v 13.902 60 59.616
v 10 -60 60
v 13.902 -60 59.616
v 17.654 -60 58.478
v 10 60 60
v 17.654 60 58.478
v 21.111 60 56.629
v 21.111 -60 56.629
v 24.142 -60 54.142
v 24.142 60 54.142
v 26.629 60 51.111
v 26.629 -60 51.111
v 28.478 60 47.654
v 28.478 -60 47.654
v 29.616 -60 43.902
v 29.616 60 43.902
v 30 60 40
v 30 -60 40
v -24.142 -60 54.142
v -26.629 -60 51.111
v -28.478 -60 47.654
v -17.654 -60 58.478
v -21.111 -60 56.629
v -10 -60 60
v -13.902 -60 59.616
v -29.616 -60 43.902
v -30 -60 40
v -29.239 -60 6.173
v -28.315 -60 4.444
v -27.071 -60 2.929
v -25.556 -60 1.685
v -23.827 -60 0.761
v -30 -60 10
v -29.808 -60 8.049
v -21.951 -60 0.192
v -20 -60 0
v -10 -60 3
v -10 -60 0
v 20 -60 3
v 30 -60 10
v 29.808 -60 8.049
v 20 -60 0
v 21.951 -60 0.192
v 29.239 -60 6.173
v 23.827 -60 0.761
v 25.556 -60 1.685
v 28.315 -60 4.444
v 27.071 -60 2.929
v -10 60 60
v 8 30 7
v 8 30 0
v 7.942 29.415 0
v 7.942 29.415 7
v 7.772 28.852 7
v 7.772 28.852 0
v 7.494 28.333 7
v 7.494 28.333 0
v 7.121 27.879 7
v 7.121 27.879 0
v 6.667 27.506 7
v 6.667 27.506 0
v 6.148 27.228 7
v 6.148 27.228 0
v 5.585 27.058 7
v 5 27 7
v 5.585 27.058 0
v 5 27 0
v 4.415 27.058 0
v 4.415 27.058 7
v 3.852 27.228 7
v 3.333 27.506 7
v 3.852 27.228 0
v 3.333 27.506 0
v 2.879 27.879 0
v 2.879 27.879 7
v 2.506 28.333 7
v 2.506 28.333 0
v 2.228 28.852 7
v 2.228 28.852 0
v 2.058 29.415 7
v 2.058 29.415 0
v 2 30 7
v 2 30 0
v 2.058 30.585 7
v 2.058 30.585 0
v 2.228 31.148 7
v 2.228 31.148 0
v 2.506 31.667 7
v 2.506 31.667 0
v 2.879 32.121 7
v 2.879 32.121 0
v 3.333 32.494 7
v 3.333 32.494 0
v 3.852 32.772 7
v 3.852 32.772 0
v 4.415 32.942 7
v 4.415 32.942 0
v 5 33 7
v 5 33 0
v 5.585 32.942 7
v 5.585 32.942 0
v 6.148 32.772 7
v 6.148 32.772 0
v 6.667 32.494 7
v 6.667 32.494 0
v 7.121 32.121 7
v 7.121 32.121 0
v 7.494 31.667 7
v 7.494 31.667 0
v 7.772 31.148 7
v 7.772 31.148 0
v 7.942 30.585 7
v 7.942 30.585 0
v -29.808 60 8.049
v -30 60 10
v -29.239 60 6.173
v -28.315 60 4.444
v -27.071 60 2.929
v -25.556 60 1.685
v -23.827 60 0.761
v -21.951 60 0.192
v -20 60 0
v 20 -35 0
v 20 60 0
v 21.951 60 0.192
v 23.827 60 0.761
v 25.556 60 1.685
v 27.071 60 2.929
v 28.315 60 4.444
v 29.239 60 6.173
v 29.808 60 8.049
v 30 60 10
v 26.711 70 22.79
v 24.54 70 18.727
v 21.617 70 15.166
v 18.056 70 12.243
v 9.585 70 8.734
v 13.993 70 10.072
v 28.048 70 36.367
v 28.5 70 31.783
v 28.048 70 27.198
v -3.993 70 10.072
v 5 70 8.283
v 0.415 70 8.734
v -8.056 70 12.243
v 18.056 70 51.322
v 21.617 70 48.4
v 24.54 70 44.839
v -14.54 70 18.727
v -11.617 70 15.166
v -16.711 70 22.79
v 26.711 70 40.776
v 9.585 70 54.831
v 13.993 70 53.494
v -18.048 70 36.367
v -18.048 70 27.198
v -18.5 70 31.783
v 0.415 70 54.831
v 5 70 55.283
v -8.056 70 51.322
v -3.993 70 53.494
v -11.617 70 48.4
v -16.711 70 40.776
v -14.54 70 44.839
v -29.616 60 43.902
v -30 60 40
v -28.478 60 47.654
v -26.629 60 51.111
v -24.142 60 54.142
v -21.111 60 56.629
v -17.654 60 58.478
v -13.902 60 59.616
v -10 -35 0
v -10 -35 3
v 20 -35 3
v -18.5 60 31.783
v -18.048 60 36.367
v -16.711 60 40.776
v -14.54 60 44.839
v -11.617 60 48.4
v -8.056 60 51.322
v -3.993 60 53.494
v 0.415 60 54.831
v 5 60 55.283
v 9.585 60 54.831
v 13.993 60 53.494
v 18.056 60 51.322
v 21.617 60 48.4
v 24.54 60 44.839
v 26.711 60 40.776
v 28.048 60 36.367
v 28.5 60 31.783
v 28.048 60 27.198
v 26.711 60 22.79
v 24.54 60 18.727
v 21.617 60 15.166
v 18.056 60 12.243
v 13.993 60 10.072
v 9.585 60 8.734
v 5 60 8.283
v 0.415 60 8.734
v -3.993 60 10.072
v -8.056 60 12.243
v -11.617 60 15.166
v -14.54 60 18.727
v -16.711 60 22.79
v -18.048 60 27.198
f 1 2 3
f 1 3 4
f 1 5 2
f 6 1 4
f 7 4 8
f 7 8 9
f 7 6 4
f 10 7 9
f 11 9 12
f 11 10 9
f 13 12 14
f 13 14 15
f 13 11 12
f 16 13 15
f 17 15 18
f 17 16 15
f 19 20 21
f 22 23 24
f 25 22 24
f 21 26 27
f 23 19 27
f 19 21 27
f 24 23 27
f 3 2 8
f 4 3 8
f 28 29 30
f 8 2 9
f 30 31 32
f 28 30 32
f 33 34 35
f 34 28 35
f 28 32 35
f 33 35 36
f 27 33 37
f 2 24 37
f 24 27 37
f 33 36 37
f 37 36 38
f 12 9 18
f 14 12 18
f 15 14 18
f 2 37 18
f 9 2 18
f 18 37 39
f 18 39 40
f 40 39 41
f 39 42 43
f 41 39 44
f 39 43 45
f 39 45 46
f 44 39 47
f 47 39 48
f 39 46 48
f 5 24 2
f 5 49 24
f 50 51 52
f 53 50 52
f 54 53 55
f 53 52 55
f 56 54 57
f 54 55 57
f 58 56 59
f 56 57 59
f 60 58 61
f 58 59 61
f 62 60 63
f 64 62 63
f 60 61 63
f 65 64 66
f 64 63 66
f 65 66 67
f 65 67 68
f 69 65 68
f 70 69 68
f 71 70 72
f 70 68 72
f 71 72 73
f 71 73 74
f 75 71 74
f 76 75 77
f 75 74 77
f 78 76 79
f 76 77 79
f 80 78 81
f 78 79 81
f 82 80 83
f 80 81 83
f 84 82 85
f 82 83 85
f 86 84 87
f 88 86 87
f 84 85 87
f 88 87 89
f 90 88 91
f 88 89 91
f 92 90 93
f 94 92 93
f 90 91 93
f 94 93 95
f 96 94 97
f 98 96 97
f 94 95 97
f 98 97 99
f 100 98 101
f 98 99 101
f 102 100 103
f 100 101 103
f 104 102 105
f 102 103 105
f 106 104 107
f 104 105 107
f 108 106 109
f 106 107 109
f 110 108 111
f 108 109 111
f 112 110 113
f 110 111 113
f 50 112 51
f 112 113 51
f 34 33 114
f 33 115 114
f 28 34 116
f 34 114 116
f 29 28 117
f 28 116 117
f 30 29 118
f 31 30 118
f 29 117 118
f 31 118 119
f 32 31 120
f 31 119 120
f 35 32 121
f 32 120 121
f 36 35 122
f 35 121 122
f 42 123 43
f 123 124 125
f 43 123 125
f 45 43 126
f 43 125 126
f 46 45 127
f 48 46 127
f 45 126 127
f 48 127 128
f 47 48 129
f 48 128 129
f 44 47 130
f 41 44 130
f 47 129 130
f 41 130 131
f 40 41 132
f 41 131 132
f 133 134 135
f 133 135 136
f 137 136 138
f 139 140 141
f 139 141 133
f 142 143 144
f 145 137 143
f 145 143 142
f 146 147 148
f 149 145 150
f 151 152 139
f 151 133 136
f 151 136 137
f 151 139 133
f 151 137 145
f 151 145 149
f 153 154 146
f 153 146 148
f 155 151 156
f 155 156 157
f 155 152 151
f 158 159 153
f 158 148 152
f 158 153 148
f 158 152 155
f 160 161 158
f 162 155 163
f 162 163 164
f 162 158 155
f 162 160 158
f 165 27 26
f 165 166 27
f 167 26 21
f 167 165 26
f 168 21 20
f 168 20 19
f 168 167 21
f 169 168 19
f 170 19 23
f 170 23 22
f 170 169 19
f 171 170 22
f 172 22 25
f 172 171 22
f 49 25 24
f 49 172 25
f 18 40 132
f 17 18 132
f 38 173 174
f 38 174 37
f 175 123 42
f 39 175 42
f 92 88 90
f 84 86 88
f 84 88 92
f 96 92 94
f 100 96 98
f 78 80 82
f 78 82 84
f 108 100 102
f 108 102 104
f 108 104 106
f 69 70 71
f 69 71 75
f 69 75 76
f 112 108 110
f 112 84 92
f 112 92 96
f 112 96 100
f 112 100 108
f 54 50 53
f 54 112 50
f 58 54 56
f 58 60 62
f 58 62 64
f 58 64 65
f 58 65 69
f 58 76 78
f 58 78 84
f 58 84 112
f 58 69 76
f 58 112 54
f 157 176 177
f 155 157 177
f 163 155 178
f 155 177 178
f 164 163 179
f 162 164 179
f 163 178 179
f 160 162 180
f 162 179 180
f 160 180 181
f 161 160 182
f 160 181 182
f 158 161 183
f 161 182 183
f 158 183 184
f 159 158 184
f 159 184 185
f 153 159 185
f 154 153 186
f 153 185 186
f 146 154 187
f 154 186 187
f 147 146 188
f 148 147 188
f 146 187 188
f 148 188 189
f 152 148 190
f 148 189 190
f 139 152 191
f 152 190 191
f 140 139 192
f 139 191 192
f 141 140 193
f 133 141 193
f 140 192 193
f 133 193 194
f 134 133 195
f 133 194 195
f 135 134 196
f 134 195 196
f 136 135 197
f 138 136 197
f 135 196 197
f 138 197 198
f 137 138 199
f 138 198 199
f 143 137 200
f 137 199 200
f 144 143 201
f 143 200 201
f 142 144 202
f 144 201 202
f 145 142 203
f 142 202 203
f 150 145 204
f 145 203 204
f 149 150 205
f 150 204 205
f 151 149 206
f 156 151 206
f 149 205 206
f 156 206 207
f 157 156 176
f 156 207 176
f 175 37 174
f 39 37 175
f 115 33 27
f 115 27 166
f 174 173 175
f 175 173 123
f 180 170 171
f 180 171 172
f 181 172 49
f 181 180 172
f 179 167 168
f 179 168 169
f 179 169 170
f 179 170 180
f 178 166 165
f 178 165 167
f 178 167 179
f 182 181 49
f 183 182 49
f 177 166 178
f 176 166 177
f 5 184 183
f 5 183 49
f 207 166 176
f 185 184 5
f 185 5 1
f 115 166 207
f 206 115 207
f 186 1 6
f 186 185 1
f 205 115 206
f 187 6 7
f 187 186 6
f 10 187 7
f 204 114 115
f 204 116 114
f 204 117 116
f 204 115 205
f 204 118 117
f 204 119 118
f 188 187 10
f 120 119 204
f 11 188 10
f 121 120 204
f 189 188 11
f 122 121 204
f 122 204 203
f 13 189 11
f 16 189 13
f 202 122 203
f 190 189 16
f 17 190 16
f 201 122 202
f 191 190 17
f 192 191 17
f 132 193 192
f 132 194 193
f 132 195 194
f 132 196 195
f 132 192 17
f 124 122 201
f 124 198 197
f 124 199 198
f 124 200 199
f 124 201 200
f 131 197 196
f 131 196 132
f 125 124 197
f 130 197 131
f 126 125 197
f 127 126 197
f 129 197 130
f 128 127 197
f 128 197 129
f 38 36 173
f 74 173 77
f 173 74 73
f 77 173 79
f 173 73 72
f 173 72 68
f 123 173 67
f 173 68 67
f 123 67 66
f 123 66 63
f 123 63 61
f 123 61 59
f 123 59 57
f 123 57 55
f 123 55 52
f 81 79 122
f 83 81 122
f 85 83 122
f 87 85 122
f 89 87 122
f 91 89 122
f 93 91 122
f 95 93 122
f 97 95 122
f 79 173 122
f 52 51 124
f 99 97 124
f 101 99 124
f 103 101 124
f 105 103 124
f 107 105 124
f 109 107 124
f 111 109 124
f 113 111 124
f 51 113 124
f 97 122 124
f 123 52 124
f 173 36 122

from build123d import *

# Parameters (mm, degrees)
F0_W     = 60
F0_H     = 120
F1_DEPTH = 60
F2_R     = 3
F3_DEPTH = 7
F4_R     = 20
F5_R     = 10
F6_R     = 23.5
F7_DEPTH = 10
F8_W     = 30
F8_H     = 25
F9_DEPTH = 3


with BuildPart() as f1:
    # F0 (on Top) → F1 (new body)
    with BuildSketch(Plane.XY):
        Rectangle(F0_W, F0_H)
    extrude(amount=F1_DEPTH)

    # F2 (on face) → F3 (cut)
    with BuildSketch(Plane(origin=(0, 0, 0), x_dir=(1, 0, 0), z_dir=(0, 0, -1))):
        with Locations((5, -30)):
            Circle(F2_R)
    extrude(amount=-F3_DEPTH, mode=Mode.SUBTRACT)

    # F4
    f4_edges = [f1.edges().sort_by_distance(p)[0] for p in [
        (30, 0, 60),
        (-30, 0, 60),
    ]]
    fillet(f4_edges, radius=F4_R)

    # F5
    f5_edges = [f1.edges().sort_by_distance(p)[0] for p in [
        (30, 0, 0),
        (-30, 0, 0),
    ]]
    fillet(f5_edges, radius=F5_R)

    # F6 (on face) → F7 (join)
    with BuildSketch(Plane(origin=(0, 60, 0), x_dir=(-1, 0, 0), z_dir=(0, 1, 0))):
        with Locations((-5, 31.7827425897)):
            Circle(F6_R)
    extrude(amount=F7_DEPTH)

    # F8 (on face) → F9 (cut)
    with BuildSketch(Plane(origin=(0, 0, 0), x_dir=(1, 0, 0), z_dir=(0, 0, -1))):
        with Locations((5, 47.5)):
            Rectangle(F8_W, F8_H)
    extrude(amount=-F9_DEPTH, mode=Mode.SUBTRACT)


solid = f1.part
